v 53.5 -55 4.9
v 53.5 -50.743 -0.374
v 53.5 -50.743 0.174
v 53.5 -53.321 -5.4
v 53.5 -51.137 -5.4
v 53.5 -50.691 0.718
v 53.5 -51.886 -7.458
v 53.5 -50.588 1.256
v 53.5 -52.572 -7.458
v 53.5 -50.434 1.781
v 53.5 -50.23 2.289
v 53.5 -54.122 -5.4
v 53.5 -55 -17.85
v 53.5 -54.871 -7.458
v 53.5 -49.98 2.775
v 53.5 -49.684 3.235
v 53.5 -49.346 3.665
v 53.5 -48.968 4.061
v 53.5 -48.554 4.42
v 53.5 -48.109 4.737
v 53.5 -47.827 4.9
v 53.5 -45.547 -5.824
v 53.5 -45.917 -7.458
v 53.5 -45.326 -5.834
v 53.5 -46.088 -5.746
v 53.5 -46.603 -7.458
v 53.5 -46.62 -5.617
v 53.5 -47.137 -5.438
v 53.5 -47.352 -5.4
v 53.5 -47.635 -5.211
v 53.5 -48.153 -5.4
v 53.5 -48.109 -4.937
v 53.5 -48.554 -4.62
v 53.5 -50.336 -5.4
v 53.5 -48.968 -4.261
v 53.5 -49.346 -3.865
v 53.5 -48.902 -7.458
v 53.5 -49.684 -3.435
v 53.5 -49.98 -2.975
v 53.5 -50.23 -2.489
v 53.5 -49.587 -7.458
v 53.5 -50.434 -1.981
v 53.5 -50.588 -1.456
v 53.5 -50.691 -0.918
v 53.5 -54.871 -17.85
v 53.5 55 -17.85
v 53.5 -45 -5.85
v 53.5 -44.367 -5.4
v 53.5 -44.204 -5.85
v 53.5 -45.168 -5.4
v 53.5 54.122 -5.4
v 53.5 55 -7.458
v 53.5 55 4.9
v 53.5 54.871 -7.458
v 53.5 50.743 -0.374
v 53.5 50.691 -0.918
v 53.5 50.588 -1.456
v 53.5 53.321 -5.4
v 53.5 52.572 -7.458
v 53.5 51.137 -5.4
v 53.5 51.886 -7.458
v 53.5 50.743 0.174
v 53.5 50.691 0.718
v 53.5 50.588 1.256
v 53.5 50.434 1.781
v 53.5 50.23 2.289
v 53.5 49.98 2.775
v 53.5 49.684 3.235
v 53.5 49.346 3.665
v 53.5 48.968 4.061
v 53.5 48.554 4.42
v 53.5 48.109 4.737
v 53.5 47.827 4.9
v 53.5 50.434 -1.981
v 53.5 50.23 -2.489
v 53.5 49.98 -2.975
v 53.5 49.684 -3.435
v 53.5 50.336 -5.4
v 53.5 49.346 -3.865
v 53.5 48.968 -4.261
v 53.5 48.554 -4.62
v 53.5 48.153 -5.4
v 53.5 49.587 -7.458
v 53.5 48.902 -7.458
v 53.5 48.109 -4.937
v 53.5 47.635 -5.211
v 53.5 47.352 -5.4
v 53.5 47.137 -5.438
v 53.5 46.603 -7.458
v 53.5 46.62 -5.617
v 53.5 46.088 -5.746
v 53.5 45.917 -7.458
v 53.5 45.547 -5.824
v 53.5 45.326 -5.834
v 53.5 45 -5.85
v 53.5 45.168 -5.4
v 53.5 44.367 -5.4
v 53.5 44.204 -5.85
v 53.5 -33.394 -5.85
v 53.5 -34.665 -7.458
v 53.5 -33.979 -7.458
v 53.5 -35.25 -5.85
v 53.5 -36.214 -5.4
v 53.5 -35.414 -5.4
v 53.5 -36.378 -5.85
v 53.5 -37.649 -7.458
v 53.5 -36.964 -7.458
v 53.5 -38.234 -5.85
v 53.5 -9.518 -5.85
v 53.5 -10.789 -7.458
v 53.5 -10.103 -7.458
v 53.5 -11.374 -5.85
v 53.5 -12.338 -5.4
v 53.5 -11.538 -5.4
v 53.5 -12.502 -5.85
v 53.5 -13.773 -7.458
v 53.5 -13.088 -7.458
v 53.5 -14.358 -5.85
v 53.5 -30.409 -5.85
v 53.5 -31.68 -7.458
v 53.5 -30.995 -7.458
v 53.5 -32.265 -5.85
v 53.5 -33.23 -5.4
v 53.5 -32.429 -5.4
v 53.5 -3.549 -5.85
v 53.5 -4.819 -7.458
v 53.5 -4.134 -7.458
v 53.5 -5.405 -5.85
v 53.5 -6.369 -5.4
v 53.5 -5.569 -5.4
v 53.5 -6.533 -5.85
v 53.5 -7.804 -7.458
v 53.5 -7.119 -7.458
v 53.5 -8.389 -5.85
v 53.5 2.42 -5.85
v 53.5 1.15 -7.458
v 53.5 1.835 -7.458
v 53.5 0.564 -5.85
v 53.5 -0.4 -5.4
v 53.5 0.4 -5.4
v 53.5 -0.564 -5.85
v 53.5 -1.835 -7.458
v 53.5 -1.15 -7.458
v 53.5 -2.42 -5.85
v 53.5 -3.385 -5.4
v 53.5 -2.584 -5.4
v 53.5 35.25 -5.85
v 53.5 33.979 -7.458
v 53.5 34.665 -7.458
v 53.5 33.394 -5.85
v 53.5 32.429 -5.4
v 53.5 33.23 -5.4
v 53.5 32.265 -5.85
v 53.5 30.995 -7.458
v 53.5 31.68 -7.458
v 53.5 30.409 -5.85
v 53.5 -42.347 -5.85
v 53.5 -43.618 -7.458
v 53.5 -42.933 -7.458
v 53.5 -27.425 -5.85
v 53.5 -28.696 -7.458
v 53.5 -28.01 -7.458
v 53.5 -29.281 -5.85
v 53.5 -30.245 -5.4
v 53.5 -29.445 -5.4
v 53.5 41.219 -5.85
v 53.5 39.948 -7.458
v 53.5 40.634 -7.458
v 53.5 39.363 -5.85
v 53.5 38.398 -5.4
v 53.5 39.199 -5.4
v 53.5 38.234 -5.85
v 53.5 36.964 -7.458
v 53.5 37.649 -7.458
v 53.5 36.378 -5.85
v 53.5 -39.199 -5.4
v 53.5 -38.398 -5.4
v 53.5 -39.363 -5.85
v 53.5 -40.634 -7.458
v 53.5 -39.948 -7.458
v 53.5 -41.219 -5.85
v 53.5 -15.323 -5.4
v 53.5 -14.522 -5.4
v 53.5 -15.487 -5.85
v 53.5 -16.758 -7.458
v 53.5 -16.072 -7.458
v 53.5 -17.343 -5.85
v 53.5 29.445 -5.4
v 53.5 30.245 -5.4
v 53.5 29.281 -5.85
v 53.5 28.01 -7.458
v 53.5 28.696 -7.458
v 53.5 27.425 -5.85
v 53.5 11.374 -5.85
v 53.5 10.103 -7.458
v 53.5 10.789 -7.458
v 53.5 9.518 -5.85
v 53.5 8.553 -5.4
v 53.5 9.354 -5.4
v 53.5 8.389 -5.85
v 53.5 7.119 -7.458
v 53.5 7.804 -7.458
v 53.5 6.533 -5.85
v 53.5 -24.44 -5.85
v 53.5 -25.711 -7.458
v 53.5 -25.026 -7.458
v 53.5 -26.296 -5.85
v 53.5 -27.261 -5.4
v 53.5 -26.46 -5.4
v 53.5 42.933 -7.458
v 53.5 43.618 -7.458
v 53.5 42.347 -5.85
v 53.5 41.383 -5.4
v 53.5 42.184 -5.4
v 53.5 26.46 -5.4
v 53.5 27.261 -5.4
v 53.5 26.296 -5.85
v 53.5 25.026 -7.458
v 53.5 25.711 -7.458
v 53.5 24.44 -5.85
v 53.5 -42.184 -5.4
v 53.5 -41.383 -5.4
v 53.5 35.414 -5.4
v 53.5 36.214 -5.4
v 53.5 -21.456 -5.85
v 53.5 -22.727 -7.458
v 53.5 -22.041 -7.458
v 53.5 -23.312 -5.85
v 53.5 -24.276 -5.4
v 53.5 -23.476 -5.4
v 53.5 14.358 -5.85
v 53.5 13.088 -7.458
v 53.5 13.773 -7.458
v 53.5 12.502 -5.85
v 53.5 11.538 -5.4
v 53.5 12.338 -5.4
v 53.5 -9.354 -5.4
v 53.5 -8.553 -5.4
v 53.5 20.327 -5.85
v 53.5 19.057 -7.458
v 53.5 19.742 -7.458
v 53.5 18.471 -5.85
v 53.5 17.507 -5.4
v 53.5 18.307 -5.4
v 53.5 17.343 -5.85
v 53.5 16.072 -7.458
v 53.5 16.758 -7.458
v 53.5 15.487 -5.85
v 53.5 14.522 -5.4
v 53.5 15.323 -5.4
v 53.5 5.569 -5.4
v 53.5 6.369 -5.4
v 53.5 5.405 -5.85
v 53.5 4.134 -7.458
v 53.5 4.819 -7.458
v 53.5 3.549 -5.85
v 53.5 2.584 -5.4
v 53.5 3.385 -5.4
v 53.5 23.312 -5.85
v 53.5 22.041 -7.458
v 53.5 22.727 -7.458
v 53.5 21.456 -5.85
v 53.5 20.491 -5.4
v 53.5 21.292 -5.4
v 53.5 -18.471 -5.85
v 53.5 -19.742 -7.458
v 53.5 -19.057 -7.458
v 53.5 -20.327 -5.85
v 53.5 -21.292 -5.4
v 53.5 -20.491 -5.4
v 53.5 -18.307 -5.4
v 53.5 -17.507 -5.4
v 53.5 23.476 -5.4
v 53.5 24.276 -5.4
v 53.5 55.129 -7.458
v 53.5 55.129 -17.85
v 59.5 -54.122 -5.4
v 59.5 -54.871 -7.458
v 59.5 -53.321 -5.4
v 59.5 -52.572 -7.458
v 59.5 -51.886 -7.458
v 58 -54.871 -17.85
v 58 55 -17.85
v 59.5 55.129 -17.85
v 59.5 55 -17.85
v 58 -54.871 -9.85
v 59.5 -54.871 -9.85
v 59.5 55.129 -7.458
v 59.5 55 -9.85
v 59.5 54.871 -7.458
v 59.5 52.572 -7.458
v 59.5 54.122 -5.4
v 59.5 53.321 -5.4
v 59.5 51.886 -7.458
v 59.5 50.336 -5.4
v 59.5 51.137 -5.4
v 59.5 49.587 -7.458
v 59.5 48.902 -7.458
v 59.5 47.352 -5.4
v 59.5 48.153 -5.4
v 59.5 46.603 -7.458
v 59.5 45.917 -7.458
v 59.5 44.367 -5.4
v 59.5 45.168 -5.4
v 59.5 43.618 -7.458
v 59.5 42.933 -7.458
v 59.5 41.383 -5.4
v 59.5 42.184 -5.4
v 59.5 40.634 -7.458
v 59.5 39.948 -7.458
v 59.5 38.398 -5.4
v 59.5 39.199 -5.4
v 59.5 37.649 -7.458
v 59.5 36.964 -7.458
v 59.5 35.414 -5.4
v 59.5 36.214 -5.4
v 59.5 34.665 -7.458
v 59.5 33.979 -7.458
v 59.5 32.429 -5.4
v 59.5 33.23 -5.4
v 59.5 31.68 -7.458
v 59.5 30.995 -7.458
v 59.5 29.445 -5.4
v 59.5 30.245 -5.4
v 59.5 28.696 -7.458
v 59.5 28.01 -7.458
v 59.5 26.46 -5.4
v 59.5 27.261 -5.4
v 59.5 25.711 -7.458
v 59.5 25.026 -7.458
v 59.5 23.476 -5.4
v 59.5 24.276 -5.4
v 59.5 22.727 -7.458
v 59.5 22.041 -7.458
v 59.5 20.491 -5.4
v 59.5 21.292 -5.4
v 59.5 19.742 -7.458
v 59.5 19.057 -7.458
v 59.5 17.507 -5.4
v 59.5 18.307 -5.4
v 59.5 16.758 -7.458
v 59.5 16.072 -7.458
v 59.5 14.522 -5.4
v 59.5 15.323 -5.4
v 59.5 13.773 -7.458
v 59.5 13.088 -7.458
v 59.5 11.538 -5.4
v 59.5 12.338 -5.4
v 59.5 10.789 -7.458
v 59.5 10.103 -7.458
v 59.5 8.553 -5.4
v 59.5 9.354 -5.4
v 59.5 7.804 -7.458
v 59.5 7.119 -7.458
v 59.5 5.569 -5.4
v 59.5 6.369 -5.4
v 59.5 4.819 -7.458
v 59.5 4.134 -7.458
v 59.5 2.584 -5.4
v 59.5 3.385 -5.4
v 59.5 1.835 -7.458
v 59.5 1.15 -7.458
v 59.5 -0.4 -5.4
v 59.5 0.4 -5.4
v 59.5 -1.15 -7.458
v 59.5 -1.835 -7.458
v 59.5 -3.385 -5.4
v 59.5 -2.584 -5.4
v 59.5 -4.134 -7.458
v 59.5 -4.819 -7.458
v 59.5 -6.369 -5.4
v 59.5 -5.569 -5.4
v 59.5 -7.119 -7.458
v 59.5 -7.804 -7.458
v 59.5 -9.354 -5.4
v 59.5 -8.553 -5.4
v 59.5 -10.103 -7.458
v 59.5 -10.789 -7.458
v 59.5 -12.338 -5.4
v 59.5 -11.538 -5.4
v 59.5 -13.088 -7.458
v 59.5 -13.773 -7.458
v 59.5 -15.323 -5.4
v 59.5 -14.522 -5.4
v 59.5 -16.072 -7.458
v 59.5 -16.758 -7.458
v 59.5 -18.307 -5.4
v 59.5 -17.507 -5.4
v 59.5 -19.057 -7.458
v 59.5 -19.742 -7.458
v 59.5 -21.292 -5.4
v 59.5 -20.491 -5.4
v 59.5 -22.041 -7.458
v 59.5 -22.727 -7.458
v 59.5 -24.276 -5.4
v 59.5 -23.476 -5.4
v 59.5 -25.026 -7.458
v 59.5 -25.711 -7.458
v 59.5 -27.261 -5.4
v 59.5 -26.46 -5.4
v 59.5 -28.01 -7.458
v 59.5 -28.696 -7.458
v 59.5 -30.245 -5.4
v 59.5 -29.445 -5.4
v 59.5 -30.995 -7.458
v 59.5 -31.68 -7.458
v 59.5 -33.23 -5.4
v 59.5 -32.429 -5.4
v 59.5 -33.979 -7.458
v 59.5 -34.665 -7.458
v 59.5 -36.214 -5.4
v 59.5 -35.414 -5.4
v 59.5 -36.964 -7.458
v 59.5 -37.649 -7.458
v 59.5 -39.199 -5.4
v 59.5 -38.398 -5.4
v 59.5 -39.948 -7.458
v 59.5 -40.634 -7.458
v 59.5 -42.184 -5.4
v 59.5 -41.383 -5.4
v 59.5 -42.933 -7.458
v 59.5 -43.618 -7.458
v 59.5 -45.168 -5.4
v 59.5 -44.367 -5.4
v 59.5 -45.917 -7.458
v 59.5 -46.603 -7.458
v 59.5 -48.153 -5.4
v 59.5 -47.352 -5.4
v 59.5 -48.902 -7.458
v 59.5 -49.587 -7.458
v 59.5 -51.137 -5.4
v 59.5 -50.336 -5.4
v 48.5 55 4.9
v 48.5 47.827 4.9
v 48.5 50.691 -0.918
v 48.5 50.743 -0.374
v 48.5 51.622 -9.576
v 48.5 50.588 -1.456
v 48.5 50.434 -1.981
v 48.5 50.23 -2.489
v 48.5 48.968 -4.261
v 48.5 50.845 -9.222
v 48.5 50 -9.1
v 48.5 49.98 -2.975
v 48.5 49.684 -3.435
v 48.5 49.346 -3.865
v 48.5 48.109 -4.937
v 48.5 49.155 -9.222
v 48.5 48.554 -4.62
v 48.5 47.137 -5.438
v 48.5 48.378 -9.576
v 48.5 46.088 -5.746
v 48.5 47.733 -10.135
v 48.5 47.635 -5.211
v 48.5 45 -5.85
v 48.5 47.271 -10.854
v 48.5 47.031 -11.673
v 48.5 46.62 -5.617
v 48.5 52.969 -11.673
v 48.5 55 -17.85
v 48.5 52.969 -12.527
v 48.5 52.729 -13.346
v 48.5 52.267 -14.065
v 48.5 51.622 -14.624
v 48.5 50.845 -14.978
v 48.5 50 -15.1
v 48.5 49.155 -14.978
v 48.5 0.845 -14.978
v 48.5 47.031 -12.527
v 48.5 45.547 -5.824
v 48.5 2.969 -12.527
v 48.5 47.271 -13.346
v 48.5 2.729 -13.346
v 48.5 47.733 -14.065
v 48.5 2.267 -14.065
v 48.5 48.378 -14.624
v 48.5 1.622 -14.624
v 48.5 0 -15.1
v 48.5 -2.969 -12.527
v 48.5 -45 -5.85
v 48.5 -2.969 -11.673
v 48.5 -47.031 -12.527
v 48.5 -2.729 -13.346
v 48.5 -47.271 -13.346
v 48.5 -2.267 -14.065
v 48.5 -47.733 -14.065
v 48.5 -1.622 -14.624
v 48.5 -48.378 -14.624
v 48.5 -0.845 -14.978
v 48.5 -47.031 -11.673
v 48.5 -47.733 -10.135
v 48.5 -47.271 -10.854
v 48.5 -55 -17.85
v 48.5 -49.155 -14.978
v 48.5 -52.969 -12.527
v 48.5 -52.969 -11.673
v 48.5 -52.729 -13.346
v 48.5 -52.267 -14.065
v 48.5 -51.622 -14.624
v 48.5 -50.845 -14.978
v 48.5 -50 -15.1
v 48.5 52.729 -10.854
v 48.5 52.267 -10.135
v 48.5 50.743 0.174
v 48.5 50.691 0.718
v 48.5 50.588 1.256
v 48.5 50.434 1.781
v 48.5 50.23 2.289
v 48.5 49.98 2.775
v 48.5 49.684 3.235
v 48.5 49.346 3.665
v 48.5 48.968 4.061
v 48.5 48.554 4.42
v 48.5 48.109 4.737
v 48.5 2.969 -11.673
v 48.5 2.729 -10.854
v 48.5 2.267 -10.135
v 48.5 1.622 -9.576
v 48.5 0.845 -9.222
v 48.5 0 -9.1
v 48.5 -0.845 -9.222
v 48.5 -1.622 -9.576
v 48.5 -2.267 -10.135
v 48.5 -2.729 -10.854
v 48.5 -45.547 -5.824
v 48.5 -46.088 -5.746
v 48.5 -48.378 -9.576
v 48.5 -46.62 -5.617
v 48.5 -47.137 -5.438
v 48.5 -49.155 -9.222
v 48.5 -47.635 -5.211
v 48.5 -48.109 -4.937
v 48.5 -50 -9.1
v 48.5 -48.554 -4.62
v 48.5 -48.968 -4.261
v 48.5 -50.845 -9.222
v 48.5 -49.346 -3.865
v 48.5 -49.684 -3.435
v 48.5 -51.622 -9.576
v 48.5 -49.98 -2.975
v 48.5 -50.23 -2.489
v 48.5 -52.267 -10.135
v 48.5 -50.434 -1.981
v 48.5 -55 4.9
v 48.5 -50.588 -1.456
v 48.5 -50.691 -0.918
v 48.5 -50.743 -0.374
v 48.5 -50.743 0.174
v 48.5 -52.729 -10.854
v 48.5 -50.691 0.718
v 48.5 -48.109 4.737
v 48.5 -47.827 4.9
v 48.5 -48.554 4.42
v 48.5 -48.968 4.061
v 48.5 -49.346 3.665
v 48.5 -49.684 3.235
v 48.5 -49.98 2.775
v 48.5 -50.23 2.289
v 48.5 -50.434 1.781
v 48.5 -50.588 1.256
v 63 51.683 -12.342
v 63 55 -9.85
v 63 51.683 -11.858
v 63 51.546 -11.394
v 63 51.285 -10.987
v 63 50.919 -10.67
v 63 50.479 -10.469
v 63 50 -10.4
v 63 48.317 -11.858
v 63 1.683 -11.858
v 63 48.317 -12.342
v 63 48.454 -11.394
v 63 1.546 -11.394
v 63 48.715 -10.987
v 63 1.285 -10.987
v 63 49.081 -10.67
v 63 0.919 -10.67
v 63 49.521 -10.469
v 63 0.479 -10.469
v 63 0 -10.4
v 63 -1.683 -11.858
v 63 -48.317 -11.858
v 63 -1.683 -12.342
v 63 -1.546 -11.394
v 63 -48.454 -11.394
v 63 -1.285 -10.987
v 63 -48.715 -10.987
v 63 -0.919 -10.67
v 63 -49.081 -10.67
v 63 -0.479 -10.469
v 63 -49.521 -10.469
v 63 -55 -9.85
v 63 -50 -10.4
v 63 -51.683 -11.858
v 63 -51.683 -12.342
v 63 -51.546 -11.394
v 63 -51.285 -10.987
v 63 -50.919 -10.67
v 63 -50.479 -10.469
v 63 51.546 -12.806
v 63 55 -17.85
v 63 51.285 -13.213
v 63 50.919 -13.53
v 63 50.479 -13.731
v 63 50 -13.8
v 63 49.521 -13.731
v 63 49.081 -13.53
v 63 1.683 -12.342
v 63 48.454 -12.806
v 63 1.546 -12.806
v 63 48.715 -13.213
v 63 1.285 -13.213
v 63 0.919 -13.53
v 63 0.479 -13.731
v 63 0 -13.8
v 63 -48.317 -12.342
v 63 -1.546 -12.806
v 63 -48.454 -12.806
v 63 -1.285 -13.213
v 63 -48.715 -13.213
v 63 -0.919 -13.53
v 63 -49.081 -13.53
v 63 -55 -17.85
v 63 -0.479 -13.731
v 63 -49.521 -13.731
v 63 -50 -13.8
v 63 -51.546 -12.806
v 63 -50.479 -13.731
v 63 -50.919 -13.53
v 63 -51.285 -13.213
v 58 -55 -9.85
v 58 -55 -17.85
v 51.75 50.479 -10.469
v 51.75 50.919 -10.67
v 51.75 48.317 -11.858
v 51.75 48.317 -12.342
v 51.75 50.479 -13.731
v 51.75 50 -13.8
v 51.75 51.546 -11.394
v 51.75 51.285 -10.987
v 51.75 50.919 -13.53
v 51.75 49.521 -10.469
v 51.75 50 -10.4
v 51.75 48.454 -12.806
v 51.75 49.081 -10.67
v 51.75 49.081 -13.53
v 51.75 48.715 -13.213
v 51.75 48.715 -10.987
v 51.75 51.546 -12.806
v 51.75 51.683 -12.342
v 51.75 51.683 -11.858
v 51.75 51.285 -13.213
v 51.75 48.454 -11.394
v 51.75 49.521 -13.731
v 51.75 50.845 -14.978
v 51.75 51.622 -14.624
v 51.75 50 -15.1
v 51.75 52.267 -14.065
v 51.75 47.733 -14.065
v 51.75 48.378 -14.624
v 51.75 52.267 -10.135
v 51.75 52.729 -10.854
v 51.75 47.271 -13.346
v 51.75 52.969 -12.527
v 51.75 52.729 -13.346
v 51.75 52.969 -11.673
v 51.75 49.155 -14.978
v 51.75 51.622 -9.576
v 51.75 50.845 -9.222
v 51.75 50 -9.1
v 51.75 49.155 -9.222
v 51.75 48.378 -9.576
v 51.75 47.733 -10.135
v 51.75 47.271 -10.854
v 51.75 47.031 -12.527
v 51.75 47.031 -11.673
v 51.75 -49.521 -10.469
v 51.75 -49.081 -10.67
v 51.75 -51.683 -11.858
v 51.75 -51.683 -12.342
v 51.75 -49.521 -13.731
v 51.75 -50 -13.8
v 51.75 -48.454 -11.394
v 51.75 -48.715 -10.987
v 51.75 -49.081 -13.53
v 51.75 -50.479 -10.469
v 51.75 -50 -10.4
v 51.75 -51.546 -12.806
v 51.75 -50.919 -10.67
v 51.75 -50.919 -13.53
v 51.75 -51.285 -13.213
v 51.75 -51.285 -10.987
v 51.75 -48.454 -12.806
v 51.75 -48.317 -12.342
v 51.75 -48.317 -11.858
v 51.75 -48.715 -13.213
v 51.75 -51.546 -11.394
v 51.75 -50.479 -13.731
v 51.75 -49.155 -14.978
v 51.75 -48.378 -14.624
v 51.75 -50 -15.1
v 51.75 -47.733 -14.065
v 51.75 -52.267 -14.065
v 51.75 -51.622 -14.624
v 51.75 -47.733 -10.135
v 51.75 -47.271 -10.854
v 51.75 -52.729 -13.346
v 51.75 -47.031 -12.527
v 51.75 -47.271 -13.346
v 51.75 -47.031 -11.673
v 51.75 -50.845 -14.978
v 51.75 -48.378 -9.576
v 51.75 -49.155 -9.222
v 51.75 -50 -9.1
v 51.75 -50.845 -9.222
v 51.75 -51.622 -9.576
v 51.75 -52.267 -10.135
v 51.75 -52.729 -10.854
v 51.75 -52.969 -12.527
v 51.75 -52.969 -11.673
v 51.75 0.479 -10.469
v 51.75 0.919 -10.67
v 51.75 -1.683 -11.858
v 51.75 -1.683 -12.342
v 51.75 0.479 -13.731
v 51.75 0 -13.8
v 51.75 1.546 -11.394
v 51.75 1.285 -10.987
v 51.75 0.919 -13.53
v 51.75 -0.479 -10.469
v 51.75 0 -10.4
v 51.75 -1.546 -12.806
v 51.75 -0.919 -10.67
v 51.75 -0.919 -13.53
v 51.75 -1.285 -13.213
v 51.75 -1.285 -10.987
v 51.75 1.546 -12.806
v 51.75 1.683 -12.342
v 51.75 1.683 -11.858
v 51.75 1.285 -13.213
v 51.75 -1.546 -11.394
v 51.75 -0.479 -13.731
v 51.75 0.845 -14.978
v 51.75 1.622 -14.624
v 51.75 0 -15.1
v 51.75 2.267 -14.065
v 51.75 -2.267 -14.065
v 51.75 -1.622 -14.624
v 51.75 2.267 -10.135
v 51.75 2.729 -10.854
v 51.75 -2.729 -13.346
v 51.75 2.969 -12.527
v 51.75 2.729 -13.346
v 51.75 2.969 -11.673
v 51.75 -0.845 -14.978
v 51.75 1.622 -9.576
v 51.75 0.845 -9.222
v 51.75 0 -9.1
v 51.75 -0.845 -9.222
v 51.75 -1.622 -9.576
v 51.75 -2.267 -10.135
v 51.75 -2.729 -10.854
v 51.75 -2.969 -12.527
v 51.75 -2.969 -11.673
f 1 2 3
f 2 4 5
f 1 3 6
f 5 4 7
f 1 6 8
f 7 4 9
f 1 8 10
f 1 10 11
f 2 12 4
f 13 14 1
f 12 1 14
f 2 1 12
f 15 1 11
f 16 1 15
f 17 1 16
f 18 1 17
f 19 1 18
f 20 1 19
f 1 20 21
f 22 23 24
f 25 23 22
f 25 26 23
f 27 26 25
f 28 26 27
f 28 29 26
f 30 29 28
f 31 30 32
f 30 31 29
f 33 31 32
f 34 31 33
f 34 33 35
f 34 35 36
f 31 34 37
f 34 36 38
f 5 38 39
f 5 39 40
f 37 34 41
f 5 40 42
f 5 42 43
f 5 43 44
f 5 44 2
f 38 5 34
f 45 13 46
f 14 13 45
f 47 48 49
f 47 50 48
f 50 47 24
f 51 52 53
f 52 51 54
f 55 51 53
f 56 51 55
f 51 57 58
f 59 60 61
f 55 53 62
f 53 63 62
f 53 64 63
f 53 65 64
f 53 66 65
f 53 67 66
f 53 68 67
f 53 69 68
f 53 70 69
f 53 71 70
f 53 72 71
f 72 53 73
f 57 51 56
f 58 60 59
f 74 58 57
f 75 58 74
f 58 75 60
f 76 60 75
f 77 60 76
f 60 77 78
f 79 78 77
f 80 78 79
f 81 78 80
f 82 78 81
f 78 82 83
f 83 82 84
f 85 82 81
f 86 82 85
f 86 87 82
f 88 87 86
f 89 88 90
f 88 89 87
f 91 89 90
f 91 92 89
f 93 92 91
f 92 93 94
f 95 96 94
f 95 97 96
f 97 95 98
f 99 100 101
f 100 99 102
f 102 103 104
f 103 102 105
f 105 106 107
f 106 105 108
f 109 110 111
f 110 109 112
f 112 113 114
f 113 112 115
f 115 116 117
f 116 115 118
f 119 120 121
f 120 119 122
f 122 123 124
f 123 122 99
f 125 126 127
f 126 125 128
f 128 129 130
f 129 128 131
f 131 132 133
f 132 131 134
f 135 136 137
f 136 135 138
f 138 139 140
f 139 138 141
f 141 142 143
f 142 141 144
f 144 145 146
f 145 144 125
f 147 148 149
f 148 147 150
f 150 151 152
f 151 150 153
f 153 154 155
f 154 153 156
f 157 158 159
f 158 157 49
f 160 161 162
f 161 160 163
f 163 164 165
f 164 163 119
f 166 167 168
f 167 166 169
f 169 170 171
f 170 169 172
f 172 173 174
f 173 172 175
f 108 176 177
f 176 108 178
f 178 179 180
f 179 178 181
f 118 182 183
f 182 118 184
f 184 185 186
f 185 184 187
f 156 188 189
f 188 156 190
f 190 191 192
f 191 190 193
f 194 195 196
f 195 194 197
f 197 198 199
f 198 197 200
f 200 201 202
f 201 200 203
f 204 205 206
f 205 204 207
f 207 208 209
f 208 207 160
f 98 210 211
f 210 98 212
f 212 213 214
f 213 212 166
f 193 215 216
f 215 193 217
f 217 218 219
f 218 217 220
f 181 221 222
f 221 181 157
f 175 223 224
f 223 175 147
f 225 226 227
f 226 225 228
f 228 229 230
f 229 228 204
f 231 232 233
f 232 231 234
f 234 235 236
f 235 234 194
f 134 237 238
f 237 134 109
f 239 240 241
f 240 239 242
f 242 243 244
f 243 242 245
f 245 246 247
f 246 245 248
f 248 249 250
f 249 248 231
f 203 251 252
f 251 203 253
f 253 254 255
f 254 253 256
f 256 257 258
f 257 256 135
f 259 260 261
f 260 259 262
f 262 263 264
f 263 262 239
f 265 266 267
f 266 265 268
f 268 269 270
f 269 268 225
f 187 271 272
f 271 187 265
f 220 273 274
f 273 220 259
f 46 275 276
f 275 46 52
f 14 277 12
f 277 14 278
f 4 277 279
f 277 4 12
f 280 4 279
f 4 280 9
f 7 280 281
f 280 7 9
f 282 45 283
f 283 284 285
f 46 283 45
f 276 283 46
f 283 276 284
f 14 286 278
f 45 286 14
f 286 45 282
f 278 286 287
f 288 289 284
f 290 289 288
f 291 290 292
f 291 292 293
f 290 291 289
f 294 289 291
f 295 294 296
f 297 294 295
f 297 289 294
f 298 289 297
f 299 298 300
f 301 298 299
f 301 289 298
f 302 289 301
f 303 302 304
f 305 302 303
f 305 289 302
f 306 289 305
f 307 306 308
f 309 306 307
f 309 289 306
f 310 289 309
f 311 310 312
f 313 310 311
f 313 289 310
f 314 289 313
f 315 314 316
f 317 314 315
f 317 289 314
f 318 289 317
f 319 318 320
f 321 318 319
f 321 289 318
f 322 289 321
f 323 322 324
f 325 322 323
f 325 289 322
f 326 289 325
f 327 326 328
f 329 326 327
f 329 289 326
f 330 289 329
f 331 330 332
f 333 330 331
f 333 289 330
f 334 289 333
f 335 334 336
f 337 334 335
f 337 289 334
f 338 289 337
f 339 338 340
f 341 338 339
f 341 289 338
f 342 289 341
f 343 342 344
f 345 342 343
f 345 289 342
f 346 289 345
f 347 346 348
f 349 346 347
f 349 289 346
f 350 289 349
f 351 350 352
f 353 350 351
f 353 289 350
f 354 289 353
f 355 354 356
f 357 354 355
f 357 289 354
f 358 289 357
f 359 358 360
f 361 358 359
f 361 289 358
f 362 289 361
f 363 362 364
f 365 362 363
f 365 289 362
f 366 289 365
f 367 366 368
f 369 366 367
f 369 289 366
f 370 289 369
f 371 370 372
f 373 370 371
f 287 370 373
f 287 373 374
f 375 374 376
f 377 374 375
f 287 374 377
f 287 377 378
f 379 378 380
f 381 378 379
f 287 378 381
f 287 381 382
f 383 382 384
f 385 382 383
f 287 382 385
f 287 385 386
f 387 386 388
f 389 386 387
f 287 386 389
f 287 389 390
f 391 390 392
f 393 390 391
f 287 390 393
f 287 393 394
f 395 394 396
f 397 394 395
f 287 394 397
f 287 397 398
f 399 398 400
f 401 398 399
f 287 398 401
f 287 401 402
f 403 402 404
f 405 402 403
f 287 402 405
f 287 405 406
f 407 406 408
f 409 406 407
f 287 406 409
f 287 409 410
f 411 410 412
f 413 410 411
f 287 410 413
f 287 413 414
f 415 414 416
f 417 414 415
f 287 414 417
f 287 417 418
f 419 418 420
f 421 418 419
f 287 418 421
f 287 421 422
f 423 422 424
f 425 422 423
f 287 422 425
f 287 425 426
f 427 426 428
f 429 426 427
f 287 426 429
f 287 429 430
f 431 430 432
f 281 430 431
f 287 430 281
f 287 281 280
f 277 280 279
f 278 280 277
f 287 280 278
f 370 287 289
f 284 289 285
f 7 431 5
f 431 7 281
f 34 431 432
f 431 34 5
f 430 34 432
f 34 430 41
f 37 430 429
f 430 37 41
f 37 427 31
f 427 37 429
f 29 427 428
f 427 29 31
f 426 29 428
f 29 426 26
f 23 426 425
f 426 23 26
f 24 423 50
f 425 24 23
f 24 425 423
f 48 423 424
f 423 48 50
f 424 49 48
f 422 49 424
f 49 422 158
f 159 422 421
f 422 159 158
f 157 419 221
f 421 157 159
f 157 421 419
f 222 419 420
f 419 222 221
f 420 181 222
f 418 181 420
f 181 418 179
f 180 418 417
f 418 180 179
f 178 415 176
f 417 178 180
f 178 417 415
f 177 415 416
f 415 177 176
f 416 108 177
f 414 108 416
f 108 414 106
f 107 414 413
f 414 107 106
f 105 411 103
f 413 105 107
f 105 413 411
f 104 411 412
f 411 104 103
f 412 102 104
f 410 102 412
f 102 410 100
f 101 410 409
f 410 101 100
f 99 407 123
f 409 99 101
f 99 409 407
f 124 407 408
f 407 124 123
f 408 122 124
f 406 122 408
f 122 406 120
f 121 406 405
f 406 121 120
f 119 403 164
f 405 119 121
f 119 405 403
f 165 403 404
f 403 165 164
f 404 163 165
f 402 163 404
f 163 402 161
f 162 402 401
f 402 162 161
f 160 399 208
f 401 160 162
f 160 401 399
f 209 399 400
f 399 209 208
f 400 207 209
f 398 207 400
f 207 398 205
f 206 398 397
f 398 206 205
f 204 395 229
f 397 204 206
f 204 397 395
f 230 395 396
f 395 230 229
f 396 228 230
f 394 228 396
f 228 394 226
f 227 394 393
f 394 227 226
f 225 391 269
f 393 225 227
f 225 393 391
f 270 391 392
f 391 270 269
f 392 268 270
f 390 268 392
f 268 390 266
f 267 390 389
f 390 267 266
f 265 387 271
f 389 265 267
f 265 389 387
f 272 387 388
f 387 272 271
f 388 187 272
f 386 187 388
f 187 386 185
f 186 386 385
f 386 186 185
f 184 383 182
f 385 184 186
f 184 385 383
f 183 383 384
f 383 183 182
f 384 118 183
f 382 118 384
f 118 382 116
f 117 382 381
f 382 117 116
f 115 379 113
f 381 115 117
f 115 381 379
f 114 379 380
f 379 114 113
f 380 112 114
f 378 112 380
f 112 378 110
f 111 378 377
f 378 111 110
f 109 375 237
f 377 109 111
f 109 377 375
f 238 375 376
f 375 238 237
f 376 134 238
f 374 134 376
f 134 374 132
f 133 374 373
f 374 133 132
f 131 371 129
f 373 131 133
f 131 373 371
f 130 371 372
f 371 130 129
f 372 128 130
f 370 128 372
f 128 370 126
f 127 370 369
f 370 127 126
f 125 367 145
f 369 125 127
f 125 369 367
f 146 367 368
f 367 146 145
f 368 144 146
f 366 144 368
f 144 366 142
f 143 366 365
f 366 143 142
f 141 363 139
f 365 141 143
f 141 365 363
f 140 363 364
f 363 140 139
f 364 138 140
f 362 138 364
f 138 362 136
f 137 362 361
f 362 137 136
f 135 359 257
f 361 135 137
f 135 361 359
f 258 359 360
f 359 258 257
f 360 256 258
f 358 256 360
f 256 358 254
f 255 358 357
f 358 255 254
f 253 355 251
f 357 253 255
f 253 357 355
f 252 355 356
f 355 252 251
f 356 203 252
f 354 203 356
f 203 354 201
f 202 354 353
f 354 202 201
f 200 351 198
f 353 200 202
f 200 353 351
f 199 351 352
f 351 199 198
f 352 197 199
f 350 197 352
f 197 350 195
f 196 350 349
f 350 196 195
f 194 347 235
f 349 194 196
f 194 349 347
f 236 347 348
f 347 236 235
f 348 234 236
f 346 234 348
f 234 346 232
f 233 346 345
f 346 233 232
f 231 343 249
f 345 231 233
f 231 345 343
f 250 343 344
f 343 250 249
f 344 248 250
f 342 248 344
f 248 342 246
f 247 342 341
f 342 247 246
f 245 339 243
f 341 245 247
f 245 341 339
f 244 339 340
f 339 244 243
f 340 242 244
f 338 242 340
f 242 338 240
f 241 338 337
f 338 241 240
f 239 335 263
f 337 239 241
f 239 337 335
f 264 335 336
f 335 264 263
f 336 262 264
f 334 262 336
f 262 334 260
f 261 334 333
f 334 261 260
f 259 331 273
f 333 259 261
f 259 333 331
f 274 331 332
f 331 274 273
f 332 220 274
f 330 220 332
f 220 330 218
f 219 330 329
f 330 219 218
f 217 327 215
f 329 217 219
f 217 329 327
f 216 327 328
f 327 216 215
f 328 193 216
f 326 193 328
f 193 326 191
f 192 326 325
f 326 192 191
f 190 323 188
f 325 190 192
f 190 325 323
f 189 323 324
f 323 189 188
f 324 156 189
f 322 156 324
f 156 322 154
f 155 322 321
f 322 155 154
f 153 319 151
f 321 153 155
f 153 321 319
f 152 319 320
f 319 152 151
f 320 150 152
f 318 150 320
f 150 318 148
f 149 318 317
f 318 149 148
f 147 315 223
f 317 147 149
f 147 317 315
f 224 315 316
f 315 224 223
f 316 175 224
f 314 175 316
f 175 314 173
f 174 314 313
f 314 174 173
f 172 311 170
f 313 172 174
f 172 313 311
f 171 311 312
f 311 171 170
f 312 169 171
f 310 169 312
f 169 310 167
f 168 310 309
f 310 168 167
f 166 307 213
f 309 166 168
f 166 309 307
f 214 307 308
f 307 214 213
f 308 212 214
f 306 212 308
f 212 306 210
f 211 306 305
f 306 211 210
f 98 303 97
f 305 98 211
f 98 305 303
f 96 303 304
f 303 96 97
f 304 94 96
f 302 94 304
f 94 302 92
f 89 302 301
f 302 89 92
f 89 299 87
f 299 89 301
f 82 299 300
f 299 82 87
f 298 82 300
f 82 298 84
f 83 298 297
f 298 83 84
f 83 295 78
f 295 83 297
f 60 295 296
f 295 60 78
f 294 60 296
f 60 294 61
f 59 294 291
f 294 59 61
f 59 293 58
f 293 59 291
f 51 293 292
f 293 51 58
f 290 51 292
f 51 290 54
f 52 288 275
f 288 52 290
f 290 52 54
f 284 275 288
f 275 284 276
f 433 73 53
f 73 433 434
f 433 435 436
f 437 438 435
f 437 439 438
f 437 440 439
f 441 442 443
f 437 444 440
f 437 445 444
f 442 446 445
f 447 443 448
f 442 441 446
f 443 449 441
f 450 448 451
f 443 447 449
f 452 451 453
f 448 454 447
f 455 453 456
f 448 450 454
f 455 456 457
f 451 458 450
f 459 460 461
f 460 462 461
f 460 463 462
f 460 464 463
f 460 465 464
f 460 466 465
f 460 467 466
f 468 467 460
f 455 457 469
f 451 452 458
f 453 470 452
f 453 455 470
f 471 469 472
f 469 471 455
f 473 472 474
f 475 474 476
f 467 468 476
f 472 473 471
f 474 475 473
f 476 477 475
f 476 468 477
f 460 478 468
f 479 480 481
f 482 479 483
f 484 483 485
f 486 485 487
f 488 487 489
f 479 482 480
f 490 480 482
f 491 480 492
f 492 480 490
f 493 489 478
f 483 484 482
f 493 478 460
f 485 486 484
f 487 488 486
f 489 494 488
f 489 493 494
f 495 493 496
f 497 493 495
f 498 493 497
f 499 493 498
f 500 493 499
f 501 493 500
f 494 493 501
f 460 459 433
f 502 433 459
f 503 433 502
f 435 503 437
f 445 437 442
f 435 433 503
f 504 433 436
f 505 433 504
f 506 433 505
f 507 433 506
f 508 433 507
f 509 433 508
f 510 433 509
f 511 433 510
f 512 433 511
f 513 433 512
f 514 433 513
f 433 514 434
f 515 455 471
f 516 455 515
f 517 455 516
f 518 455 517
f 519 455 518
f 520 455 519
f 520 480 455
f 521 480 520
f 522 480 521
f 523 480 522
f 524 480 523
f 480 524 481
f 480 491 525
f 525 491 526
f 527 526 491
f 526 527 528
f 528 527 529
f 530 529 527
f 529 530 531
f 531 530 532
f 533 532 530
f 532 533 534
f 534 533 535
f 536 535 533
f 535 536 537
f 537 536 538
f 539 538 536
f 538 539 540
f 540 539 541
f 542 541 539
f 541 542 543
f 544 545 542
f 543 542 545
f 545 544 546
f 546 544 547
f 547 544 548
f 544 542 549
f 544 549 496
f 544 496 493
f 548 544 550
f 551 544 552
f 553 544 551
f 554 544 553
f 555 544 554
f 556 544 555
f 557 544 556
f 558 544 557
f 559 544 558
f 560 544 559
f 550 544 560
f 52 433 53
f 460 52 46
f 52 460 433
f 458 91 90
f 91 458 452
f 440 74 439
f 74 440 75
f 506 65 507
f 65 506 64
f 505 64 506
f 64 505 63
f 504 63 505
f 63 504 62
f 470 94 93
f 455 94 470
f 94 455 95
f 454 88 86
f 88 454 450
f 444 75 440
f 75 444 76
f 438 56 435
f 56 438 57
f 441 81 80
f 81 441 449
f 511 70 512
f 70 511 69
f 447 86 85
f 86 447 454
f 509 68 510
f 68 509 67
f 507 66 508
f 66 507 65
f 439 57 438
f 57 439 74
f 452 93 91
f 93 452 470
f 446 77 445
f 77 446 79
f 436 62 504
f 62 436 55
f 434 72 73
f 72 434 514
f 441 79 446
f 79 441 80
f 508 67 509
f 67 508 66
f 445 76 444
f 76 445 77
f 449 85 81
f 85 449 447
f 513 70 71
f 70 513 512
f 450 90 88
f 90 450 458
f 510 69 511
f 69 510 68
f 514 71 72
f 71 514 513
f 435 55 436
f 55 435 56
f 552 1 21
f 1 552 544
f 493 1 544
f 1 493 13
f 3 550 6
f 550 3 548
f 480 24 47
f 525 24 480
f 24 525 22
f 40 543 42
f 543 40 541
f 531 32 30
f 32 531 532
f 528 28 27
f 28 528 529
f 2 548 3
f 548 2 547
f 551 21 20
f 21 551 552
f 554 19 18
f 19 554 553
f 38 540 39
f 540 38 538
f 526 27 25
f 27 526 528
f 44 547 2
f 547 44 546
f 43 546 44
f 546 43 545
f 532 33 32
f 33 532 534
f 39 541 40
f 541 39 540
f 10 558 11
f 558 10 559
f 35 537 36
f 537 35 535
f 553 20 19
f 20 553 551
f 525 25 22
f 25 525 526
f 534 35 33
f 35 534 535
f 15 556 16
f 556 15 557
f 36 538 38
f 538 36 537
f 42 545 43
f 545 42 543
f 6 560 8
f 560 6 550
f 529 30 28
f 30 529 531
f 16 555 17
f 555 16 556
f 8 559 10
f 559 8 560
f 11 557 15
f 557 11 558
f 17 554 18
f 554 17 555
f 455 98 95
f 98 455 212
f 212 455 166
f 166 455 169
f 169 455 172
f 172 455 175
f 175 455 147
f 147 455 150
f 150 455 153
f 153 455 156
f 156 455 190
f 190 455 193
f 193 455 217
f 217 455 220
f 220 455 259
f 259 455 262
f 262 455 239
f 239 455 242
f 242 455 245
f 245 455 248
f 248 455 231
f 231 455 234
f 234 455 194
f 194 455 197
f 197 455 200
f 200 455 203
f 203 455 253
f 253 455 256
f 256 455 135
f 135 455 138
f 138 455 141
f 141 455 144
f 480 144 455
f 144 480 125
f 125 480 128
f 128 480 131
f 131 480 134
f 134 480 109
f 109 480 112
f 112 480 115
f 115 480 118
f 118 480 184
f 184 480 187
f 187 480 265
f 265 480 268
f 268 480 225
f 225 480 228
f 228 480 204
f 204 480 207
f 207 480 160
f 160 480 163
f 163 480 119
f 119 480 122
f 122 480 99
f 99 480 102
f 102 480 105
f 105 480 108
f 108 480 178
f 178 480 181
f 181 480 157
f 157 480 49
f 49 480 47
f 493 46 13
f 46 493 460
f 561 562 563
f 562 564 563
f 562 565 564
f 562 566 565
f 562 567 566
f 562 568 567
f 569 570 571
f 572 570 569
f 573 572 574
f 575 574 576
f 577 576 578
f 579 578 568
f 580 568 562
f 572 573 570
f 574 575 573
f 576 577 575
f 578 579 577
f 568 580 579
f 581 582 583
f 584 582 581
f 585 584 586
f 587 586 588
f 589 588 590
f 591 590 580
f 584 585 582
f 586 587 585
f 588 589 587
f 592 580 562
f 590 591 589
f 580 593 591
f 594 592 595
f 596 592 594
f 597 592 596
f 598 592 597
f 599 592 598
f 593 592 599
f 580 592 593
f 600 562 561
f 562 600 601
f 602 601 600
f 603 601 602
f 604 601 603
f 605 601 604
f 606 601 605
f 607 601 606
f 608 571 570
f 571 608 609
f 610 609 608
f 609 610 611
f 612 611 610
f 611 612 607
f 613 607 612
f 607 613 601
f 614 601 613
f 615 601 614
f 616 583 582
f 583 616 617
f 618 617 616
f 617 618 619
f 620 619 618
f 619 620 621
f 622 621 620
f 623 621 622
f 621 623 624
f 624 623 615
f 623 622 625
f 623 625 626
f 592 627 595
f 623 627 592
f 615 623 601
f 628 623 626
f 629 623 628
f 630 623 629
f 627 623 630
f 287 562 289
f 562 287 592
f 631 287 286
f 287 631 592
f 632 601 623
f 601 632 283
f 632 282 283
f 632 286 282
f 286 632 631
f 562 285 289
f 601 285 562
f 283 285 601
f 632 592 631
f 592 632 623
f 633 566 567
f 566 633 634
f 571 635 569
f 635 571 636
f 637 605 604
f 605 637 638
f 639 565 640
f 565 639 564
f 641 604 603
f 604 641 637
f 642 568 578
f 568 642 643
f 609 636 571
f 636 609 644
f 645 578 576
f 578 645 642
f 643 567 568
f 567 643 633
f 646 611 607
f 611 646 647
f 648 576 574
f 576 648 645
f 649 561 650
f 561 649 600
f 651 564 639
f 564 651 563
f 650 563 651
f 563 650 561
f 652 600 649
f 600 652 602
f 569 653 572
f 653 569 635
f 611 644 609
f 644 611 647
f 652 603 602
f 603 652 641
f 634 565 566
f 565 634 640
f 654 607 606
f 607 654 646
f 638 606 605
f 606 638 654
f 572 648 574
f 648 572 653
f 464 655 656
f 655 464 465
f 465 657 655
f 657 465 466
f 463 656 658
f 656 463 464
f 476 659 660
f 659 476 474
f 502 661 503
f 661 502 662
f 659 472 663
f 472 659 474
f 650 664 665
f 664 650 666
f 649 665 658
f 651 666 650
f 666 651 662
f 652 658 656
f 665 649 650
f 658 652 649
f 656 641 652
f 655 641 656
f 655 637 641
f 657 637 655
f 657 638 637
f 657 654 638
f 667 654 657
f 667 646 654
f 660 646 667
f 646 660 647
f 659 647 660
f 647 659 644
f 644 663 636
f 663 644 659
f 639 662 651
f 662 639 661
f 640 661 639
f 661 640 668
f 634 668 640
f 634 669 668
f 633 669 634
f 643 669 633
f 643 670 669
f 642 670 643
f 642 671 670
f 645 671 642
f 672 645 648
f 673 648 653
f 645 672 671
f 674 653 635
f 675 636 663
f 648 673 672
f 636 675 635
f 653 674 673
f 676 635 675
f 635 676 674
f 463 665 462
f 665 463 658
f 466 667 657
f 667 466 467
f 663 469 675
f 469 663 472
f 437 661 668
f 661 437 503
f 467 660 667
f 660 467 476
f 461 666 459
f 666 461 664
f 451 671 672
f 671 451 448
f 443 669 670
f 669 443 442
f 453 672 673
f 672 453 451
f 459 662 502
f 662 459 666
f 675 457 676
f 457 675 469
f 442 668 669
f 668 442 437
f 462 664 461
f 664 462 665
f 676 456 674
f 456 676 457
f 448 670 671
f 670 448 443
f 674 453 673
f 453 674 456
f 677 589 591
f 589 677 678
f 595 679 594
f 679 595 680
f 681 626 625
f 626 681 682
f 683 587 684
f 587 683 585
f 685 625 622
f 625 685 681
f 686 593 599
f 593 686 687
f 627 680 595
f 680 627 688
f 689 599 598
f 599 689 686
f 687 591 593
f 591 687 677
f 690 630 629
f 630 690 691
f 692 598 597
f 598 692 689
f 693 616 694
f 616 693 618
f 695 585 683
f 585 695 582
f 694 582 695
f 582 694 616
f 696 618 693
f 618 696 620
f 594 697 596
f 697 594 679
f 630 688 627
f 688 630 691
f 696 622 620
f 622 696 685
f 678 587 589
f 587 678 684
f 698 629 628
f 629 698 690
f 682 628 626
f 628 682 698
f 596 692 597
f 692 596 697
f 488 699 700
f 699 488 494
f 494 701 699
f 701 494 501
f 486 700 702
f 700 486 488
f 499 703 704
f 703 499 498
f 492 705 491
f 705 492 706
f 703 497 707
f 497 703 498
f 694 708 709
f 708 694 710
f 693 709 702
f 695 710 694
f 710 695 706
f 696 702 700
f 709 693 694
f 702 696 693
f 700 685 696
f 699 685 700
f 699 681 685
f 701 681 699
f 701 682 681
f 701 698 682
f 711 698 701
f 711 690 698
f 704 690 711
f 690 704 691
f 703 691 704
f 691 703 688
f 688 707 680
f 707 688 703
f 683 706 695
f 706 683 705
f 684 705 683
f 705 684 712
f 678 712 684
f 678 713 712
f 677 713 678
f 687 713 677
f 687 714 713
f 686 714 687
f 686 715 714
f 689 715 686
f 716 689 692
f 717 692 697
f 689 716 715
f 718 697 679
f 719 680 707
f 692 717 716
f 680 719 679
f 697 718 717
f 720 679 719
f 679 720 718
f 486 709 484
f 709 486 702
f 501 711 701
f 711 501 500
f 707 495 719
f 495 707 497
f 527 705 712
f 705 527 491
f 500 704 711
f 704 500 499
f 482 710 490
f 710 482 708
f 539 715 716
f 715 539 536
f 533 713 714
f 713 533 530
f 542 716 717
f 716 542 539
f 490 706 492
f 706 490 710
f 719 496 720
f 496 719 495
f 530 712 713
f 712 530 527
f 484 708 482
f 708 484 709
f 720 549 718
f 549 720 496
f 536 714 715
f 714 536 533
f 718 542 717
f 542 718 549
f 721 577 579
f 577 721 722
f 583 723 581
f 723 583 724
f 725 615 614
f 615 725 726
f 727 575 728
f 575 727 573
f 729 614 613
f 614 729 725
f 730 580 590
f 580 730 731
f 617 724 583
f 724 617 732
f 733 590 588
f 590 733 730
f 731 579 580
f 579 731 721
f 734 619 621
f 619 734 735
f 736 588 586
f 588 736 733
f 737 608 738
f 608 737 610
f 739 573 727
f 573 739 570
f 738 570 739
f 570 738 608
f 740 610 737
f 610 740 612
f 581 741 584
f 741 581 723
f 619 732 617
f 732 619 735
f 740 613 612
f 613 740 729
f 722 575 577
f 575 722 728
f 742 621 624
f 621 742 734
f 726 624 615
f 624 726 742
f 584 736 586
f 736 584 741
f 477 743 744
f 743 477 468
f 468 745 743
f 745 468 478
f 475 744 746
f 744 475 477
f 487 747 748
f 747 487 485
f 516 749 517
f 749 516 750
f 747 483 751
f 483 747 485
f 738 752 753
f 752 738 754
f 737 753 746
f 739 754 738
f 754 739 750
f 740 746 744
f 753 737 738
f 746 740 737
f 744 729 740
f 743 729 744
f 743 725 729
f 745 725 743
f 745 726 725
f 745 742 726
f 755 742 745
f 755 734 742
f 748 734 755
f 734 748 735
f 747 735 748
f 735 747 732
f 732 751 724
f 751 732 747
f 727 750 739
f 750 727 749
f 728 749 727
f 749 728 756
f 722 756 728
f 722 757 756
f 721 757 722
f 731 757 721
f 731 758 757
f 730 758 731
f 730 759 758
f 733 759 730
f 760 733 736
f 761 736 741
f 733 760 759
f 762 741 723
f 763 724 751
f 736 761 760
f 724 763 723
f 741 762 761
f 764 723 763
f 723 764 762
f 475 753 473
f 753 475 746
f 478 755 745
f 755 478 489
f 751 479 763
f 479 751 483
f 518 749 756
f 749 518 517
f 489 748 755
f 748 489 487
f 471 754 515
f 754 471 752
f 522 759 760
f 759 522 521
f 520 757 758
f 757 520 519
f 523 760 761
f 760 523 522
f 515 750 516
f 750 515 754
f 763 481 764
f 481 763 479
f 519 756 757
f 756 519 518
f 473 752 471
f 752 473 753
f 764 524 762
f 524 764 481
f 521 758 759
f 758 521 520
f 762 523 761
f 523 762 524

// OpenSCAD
// file: ../Parts/rounder.scad
// rounder.scad
// cutting tool for rounding off corners with a cylinder

//---------------------
module rounder(
r=10,   // radius
h=10,   // height
f=22,    // $fn
extra=0.01  // extra size for the cube
){

difference(){
  translate([-extra,-extra,-extra])
  cube([r+extra,r+extra,h+2*extra]);
  translate([r,r,-1])
  cylinder(r=r,h=h+2,$fn=f);
}

}

//---------------------------------------------------------------------------
module bevel(x=1,y=1,h=10){

linear_extrude(height=h)
polygon(points=[[0,0],[x,0],[0,y]]);
    
}
  

//========================

rounder();

//========================
// main file
//======================================================================
// RewinderRamp.scad
//
// New version of the filament spool rewinder.
//
// DrTomFlint 26 June 2023
//
//======================================================================


use <../Parts/rounder.scad>
use <../Parts/threads.scad>
use <../Gears/gears.scad>

// draft setting removes threads
draft=0;

// spool
//wide=62;		// width of a spool
wide=75;      // wider spools for the UV filament
r0=100;     // radius of spool
wall=4.5;   // thickness of spool wall
bore=54.5/2;  // radius of bore hole

// main shaft
r1=16;        // radius of the main shaft
x1=95;        // length of main shaft
x1b=20;       // length of thread on shaft2
r2=8;         // radius of gear-shaft inserts

// taper nuts on main shaft
r3=20;        // radius of nut body
r4=40;        // radius of nut wings
r5=12;        // taper cut radius

// lock nut
r6=20;        // radius of nut body
r7=30;        // radius of wings

// spur gears
xroller=6;
rroller=5.75;
rlip=8;
xgear=6;

// rack beam
xrack = 100;

// box outer dimensions
bx3=123.5;
by3=350;
bz3=220;
thick=3;

F1=201;
F2=66;

//----------------------------------------------------------------------
module spool(pos=0){

translate([0,pos,0])

translate([wide/2,0,0])
rotate([0,-90,0])
difference(){
  union(){
    cylinder(r=r0,h=wall,$fn=F2);
    translate([0,0,wall])
    cylinder(r=bore+wall,h=wide-2*wall,$fn=F2);
    translate([0,0,wide-wall])
    cylinder(r=r0,h=wall,$fn=F2);
  }
  translate([0,0,-1])
  cylinder(r=bore,h=wide+2,$fn=F2);
}

}


//----------------------------------------------------------------------
// 2:32 to render make one set of threads be backwards so pulling on the
// spool will tighten both ends.  Color code the spurs and nuts.
module shaft2(pos=0){

  translate([0,pos,0])

  difference(){
    union(){
      // threaded end
      translate([-x1/2,0,0])
      rotate([0,90,0])
      if(draft==1){
        cylinder(r=r1,h=x1,$fn=F2);
      }else{
        metric_thread (diameter=2*r1, pitch=3, length=x1/3, internal=false, n_starts=1, thread_size=-1, groove=false, square=false, rectangle=0,angle=30, taper=0, leadin=2, leadfac=1.0, test=false);
      }
      mirror([1,0,0])
      translate([-x1/2,0,0])
      rotate([0,90,0])
      if(draft==1){
        cylinder(r=r1,h=x1,$fn=F2);
      }else{
        metric_thread (diameter=2*r1, pitch=3, length=x1/3, internal=false, n_starts=1, thread_size=-1, groove=false, square=false, rectangle=0,angle=30, taper=0, leadin=2, leadfac=1.0, test=false);
      }
      translate([0,0,0])
      rotate([0,90,0])
      cylinder(r=r1,h=x1/3,$fn=F2,center=true);

    }
    
    // cuts to insert gear ends
    translate([-x1/2-0.1,0,0])
    rotate([0,90,0])
    cylinder(r=rroller+0.15,h=12.25,$fn=99);

    translate([x1/2+0.1,0,0])
    rotate([0,-90,0])
    cylinder(r=rroller+0.15,h=12.25,$fn=99);
    
    // center cuts to allow an M3 bolt to strengthen attachment of spurs
    rotate([0,-90,0])
    cylinder(r=1.7,h=x1+20,$fn=22,center=true);
    
  }
        
}

//----------------------------------------------------------------------
// 2:32 to render make one set of threads be backwards so pulling on the
// spool will tighten both ends.  Color code the spurs and nuts.
// Hollow out shaft3 to make a clutch with felt liner.  
module shaft3(pos=0){

  translate([0,pos,0])

  difference(){
    union(){
      // threaded end
      translate([-x1/2,0,0])
      rotate([0,90,0])
      if(draft==1){
        cylinder(r=r1,h=x1,$fn=F2);
      }else{
        metric_thread (diameter=2*r1, pitch=3, length=x1/3, internal=false, n_starts=1, thread_size=-1, groove=false, square=false, rectangle=0,angle=30, taper=0, leadin=2, leadfac=1.0, test=false);
      }
      mirror([1,0,0])
      translate([-x1/2,0,0])
      rotate([0,90,0])
      if(draft==1){
        cylinder(r=r1,h=x1,$fn=F2);
      }else{
        metric_thread (diameter=2*r1, pitch=3, length=x1/3, internal=false, n_starts=1, thread_size=-1, groove=false, square=false, rectangle=0,angle=30, taper=0, leadin=2, leadfac=1.0, test=false);
      }
      translate([0,0,0])
      rotate([0,90,0])
      cylinder(r=r1,h=x1/3,$fn=F2,center=true);

    }
    
    // cuts for clutch insert
    translate([0,0,0])
    rotate([0,90,0])
    cylinder(r=r1-5,h=x1,$fn=F1,center=true);
    
  }
        
}

//-------------------------------------------------------------------------
module clutch3(pos=0,gap=1.5){

  translate([0,pos,0])

  difference(){
    union(){
      translate([0,0,0])
      rotate([0,90,0])
      cylinder(r=r1-5-gap,h=x1,$fn=F2,center=true);

    }
    
    // cuts to insert gear ends
    translate([-x1/2-0.1,0,0])
    rotate([0,90,0])
    rotate([0,0,30])
    cylinder(r=rroller+0.15,h=12.25,$fn=6);

    translate([x1/2+0.1,0,0])
    rotate([0,-90,0])
    rotate([0,0,30])
    cylinder(r=rroller+0.15,h=12.25,$fn=6);
    
    // center cuts to allow an M3 bolt to strengthen attachment of spurs
    rotate([0,-90,0])
    cylinder(r=1.7,h=x1+20,$fn=22,center=true);
    
    // make a flat side for printing and felt seam
    translate([0,0,-100-8])
    cube([200,200,200],center=true);
  }
        
}

//----------------------------------------------------------------------
// straight = red right side
// mirror = green left side
module nut(pos=0){

  translate([0,pos,0])

  translate([wide/2-10,0,0])
  rotate([0,90,0])
  difference(){
    cylinder(r=r4,h=14,$fn=99);
    
    translate([0,0,-1])
    rotate_extrude($fn=99)
    translate([r4+2,0,0])
    scale([1.8,1])
    circle(r=r5,$fn=88);
    
    // main bore
    translate([0,0,-0.1])
    if(draft==1){
      cylinder(r=r1+0.4, h=x1);
    }else{
      metric_thread (diameter=2*r1+0.4, pitch=3, length=x1, internal=true, n_starts=1, thread_size=-1, groove=false, square=false, rectangle=0,angle=30, taper=0, leadin=0, leadfac=1.0, test=false);
    }
    
// cuts for wings
    for(i=[0:4]){
      rotate([0,0,i*72])
      translate([r4,0,12])
      scale([1,1.4,1])
      cylinder(r=10,h=6,center=true,$fn=99);
    }
  }
  
}  

//----------------------------------------------------------------------
// make a locking nut
module nut2(pos=0){

  translate([0,pos,0])

  translate([x1/2-7,0,0])
  rotate([0,90,0])
  difference(){
    union(){
      cylinder(r1=r6,r2=r7,h=4,$fn=44);
      translate([0,0,4])
      cylinder(r=r7,h=2,$fn=44);
    }
    
    // main bore
    translate([0,0,-0.1])
    if(draft==1){
      cylinder(r=r1+0.4, h=x1);
    }else{
      metric_thread (diameter=2*r1+0.4, pitch=3, length=x1, internal=true, n_starts=1, thread_size=-1, groove=false, square=false, rectangle=0,angle=30, taper=0, leadin=3, leadfac=1.0, test=false);
    }
    
// cuts for wings
    for(i=[0:4]){
      rotate([0,0,i*72])
      translate([r4-10,0,6])
      scale([1,1.4,1])
      cylinder(r=10,h=16,center=true);
    }
  }
  
}  

//----------------------------------------------------------------------
module spur(pos=0){

  translate([0,pos,0])
  
  difference(){
    union(){
      // insert into shaft
      translate([x1/2-xgear-xroller/2-3,0,0])
      rotate([0,90,0])
      cylinder(r=rroller,h=12,$fn=99);
      
      // roller section
      translate([x1/2,0,0])
      rotate([0,90,0])
      cylinder(r=rroller,h=xroller,$fn=F1);

      // gear
      translate([x1/2+xroller,0,0])
      rotate([0,90,0])
      
      // rotate gear to mesh with rack here
      rotate([0,0,360/24])
      spur_gear (modul=1, tooth_number=12, width=xgear, bore=2, pressure_angle=20, helix_angle=0, optimized=false);

      // overhanging lip section
      translate([x1/2+xroller+xgear,0,0])
      rotate([0,90,0])
      cylinder(r2=9,r1=7,h=0.5,$fn=F2);
      translate([x1/2+xroller+xgear+0.5,0,0])
      rotate([0,90,0])
      cylinder(r=9,h=1.5,$fn=F2);
    }
    
    // cut a center hole
    rotate([0,90,0])
    cylinder(r=1.7,h=x1+40,$fn=F2,center=true);
    translate([x1/2+xroller+xgear+0.5,0,0])  
    rotate([0,90,0])
    cylinder(r=3,h=3.5,center=true,$fn=22);
    
  }

}

//----------------------------------------------------------------------
module spur3(pos=0){

  translate([0,pos,0])
  
  difference(){
    union(){
      // insert into shaft
      translate([x1/2-xgear-xroller/2-3,0,0])
      rotate([0,90,0])
      cylinder(r=rroller,h=12,$fn=6);
      
      // roller section
      translate([x1/2,0,0])
      rotate([0,90,0])
      cylinder(r=rroller,h=xroller,$fn=F1);

      // gear
      translate([x1/2+xroller,0,0])
      rotate([0,90,0])
      
      // rotate gear to mesh with rack here
      rotate([0,0,360/24])
      spur_gear (modul=1, tooth_number=12, width=xgear, bore=2, pressure_angle=20, helix_angle=0, optimized=false);

      // overhanging lip section
      translate([x1/2+xroller+xgear,0,0])
      rotate([0,90,0])
      cylinder(r2=9,r1=7,h=0.5,$fn=F2);
      translate([x1/2+xroller+xgear+0.5,0,0])
      rotate([0,90,0])
      cylinder(r=9,h=1.5,$fn=F2);
    }
    
    // cut a center hole
    rotate([0,90,0])
    cylinder(r=1.7,h=x1+40,$fn=F2,center=true);
    translate([x1/2+xroller+xgear+0.5,0,0])  
    rotate([0,90,0])
    cylinder(r=3,h=3.5,center=true,$fn=22);
    
  }

}

//----------------------------------------------------------------------
// straight = green left side
// mirror = red right side
module beam3(){

translate([0,0,-0.1])
difference(){
  union(){
    // rack
    translate([x1/2+xroller,0,-6.25])
    rotate([90,0,0])
    rotate([0,90,0])
    rack(modul=1, length=xrack+10, height=11.5, width=xgear, pressure_angle=20, helix_angle=0);

    // roller section  
    translate([x1/2+xroller/2+0.5,0,-rroller-6])
    cube([xroller-1,xrack+10,12],center=true);

    // lower roller stop  
    difference(){
      translate([x1/2+xroller/2+0.5,xrack/2,-5])
      cube([xroller-1,10,20],center=true);

      translate([x1/2+xroller/2+0.5,xrack/2+3,-5.75])
      translate([0,-8,rroller])
      rotate([0,90,0])
      cylinder(r=rroller,h=xroller+1,center=true,$fn=F2);
    }
    
    // upper roller stop  
    difference(){
      translate([x1/2+xroller/2+0.5,-xrack/2,-5])
      cube([xroller-1,10,20],center=true);

      translate([x1/2+xroller/2+0.5,-xrack/2-3,-5.75])
      translate([0,8,rroller])
      rotate([0,90,0])
      cylinder(r=rroller,h=xroller+1,center=true,$fn=F2);
    }
    
    // offset for lip clearance
    translate([x1/2+xroller/2+10,0,-rroller-8])
    cube([xroller-1,xrack+10,8],center=true);

  }   // end of union

  // cuts to mount with M3, bolt and head clearance
  translate([x1/2+xroller/2,0,-13])
  translate([3,xrack/2,1])  
  rotate([0,90,0]){
    cylinder(r=1.7,h=20,center=true,$fn=22);
    translate([0,0,-3.5])  
    cylinder(r=3,h=3.5,center=true,$fn=22);
  }
  
  translate([x1/2+xroller/2,0,-13])
  translate([3,-xrack/2,1])  
  rotate([0,90,0]){
    cylinder(r=1.7,h=20,center=true,$fn=22);
    translate([0,0,-3.5])  
    cylinder(r=3,h=3.5,center=true,$fn=22);
  }

  translate([x1/2+xroller/2,0,-13])
  translate([3,0,1])  
  rotate([0,90,0]){
    cylinder(r=1.7,h=20,center=true,$fn=22);
    translate([0,0,-3.5])  
    cylinder(r=3,h=3.5,center=true,$fn=22);
  }

}

}

//----------------------------------------------------------------------
// make the beams at slope = 0 degrees, make the box as small as possible
// and tilt the entire assembly as required to get good torque
module box3(thick=3){
  
  translate([0,-5,0])
  difference(){
    cube([bx3,by3,bz3],center=true);
    translate([0,0,thick])
    cube([bx3-2*thick,by3-2*thick,bz3],center=true);
  }
  
  
}
  
//======================================================================

// change pos1 to move the spool, spur, and shaft
//pos1=-xrack/2+6;   // top
pos1=xrack/2-6;   // bottom
//pos1=0;

// cutaway view of the box
if(0){
  difference(){
    union(){
      box3();
      //top3();
    }
    translate([0,by3/2-5-thick/2,0])
    cube([bx3+20,thick+0.1,bz3+20],center=true);
    translate([bx3/2-thick/2,0,0])
    cube([thick+0.1,by3+20,bz3+20],center=true);
  }
}

//box3();
//top3();

//color("gray",alpha=0.3)
//spool(pos=pos1);

//shaft2(pos=pos1);

// cutaway view of shaft and spur
if(0){
  difference(){
    union(){
      //shaft3();
      //spur3();
      clutch3();
    }
    translate([0,0,100])
    cube([200,200,200],center=true);
  }
}

//shaft3();
//spur3();
//clutch3();

//nut(pos=pos1);
//mirror([1,0,0]) nut(pos=pos1);

//nut2(pos=pos1);
//mirror([1,0,0]) nut2();

//color("cyan")
//spur(pos=pos1);
//mirror([1,0,0]) spur(pos=pos1);

//color("gray",alpha=0.3)
beam3();
//mirror([1,0,0]) beam3();


//======================================================================
